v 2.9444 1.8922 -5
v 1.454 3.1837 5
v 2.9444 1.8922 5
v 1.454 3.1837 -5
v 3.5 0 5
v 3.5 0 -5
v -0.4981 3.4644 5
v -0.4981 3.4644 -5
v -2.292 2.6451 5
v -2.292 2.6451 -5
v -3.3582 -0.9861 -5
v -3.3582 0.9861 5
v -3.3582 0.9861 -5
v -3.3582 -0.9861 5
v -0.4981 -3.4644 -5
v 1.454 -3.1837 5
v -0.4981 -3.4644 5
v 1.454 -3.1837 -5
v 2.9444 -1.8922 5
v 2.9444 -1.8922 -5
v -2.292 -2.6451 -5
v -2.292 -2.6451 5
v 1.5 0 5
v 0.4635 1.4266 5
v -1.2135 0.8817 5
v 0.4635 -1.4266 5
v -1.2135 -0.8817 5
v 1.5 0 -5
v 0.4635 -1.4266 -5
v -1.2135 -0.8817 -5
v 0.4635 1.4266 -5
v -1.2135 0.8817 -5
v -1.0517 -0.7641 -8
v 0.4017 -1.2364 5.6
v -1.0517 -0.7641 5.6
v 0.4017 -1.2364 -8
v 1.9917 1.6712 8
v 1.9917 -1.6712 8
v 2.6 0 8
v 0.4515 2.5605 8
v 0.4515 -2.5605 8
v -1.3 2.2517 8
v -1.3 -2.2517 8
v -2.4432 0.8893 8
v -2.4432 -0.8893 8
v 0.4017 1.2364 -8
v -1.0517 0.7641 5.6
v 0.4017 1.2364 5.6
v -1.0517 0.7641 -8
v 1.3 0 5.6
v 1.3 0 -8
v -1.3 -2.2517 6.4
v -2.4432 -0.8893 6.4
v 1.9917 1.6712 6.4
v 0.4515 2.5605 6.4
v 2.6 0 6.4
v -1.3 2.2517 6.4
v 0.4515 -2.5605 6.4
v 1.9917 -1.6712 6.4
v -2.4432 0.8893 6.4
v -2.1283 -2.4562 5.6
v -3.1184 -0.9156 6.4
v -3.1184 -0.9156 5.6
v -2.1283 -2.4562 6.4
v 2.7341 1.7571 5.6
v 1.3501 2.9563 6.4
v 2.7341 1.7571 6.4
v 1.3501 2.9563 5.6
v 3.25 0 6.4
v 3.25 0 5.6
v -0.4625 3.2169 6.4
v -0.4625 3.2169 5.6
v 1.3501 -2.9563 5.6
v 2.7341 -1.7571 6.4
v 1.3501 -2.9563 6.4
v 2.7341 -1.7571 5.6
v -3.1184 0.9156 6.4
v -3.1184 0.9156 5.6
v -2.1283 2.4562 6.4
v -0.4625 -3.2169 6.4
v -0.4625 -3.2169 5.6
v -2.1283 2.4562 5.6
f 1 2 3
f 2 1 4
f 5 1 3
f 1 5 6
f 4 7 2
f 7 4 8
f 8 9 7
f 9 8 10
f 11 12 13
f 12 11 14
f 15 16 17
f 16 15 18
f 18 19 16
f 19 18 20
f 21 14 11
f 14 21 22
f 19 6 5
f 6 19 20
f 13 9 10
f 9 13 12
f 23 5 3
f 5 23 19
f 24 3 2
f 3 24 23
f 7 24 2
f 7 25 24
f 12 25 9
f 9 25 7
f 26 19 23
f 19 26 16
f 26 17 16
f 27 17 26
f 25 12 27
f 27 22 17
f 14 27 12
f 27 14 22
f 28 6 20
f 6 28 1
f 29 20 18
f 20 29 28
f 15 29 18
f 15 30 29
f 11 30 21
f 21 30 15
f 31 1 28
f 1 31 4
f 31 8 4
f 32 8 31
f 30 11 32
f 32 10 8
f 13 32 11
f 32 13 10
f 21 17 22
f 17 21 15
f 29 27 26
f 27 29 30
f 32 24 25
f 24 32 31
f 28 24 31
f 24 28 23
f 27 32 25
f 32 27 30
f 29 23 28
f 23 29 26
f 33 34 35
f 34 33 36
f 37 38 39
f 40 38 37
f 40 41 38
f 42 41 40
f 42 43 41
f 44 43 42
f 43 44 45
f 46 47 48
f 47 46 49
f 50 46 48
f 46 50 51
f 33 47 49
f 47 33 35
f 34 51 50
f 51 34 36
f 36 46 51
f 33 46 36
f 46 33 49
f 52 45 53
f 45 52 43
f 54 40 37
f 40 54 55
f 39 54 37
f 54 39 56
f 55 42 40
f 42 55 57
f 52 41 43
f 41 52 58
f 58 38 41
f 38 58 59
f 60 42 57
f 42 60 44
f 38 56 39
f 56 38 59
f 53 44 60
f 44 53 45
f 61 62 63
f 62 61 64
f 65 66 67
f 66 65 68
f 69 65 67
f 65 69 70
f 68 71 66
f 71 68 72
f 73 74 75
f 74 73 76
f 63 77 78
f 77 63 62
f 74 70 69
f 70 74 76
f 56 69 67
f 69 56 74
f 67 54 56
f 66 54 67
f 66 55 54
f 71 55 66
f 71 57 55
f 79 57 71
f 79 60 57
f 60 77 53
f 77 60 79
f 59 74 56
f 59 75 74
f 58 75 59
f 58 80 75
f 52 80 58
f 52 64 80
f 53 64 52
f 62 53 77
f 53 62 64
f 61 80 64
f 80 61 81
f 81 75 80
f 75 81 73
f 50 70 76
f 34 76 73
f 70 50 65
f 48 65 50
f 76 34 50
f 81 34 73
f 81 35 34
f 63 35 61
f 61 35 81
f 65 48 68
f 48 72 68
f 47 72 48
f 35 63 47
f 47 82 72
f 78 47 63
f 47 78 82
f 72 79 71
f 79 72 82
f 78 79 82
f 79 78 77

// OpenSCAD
// Parameters
bore_diameter_mm = 3; //[1.5:6:0.1]
outer_diameter_mm = 7; //[3.5:14:0.1]
length_mm = 10; //[5:20:0.1]
centered = 1; //[0:1:1]
wall_thickness_mm = 2; //[1:4:0.1]
eps_mm = 0.6; //[0.2:2:0.1]
screw_shank_diameter_mm = 2.6; //[1.5:3.2:0.1]
screw_head_diameter_mm = 5.2; //[3.5:8:0.1]
screw_head_height_mm = 2.2; //[1:4:0.1]
washer_outer_diameter_mm = 6.5; //[4:10:0.1]
washer_thickness_mm = 0.8; //[0.4:2:0.1]
screw_length_mm = 16; //[10:30:0.5]

// Linear Bearing - complete geometry
module linear_bearing() {
  color([0.85, 0.85, 0.8]) {
    difference() {
      // Outer body
      cylinder(r=outer_diameter_mm/2, h=length_mm, center=true);
      // Through bore
      cylinder(r=bore_diameter_mm/2, h=length_mm + 2*eps_mm, center=true);
    }
  }
}

// Screw and Washer - complete geometry
module screw_and_washer() {
  color("DimGray") {
    union() {
      // Screw shank
      cylinder(r=screw_shank_diameter_mm/2, h=screw_length_mm, center=true);
      // Screw head
      translate([0, 0, screw_length_mm/2 - screw_head_height_mm/2])
        cylinder(r=screw_head_diameter_mm/2, h=screw_head_height_mm, center=true);
      // Washer
      translate([0, 0, screw_length_mm/2 - screw_head_height_mm - washer_thickness_mm/2 + eps_mm])
        cylinder(r=washer_outer_diameter_mm/2, h=washer_thickness_mm, center=true);
    }
  }
}

// Assembly
module assembly() {
  linear_bearing();
  screw_and_washer();
}

assembly();
